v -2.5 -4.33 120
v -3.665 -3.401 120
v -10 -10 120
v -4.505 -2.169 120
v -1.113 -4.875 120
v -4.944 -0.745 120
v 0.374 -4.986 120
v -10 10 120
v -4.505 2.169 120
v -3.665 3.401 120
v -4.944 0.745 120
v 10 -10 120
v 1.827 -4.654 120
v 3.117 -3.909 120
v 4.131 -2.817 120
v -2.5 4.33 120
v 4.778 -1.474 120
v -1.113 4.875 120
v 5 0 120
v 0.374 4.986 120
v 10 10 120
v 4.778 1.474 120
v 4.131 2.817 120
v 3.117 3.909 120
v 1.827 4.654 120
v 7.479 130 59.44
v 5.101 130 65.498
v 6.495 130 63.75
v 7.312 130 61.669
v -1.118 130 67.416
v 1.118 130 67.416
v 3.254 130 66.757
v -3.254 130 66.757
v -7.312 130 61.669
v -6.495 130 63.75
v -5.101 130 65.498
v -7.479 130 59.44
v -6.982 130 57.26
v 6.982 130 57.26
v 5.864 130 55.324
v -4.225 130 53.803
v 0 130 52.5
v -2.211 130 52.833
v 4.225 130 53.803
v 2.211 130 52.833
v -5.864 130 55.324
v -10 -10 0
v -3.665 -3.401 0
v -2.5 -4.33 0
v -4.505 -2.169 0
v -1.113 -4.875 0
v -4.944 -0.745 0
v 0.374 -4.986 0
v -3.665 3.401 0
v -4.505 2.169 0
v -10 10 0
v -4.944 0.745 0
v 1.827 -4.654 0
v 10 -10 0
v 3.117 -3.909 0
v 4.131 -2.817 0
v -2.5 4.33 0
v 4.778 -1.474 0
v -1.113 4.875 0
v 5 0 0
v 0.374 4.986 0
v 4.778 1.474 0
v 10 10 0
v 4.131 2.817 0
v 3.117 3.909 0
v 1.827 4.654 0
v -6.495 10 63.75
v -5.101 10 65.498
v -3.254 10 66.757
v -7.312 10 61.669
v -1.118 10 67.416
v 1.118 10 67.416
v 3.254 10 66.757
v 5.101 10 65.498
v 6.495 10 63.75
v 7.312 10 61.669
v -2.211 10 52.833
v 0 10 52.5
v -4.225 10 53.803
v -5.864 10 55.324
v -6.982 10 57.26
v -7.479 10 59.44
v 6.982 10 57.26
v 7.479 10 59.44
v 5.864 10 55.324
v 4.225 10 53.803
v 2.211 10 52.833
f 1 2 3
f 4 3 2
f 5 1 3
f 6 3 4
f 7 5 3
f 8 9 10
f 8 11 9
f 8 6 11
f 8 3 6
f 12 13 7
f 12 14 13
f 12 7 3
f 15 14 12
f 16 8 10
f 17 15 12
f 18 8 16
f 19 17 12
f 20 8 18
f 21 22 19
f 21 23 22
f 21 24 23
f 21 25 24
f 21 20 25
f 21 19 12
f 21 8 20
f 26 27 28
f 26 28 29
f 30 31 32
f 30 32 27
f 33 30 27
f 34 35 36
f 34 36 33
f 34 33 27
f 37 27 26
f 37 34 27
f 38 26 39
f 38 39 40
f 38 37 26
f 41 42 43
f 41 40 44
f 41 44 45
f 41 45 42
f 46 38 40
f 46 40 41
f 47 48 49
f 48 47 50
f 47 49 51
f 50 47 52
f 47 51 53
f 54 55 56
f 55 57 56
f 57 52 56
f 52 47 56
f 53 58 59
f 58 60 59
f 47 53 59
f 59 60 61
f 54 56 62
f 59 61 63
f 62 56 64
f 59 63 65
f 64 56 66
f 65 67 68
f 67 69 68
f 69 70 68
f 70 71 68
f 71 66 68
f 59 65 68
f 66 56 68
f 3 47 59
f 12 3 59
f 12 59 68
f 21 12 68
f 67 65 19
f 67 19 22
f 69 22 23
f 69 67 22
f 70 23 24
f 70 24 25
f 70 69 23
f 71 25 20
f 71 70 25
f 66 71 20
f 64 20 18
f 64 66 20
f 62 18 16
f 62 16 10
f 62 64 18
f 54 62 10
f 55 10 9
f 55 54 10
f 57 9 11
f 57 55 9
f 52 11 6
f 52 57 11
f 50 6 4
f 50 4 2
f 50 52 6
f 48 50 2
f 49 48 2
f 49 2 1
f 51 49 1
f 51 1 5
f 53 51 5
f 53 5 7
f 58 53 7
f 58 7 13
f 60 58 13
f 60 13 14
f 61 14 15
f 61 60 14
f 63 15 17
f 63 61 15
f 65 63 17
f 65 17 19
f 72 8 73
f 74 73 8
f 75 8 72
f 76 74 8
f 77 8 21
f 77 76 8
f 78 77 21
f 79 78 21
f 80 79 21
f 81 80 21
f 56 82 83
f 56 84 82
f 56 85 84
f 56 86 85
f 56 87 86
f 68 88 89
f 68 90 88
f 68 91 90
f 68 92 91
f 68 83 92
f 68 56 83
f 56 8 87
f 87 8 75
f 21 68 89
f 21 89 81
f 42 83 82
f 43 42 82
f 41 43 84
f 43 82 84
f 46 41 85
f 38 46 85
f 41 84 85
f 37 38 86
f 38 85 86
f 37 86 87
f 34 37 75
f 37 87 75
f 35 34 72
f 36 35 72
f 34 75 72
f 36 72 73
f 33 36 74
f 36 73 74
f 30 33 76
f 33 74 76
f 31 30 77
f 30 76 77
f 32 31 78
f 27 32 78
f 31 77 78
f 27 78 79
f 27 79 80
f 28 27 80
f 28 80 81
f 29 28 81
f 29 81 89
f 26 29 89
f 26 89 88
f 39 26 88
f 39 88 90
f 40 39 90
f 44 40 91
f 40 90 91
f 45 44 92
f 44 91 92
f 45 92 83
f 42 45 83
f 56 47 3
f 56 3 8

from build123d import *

# Parameters (mm, degrees)
SKETCH1_W           = 20
SKETCH1_H           = 20
SKETCH1_R           = 5
BOSS_EXTRUDE1_DEPTH = 120
SKETCH2_R           = 7.5
BOSS_EXTRUDE2_DEPTH = 120


with BuildPart() as part:
    # Sketch1 → Boss-Extrude1 (new body)
    with BuildSketch(Plane.XY):
        Rectangle(SKETCH1_W, SKETCH1_H)
        Circle(SKETCH1_R, mode=Mode.SUBTRACT)
    extrude(amount=BOSS_EXTRUDE1_DEPTH)

    # Sketch2 → Boss-Extrude2 (add)
    with BuildSketch(Plane(origin=(0, 10, 0), x_dir=(1, 0, 0), z_dir=(0, 1, 0))):
        with Locations(Location((0, -60, 0), (0, 0, 90))):
            Circle(SKETCH2_R)
    extrude(amount=BOSS_EXTRUDE2_DEPTH)


solid = part.part
